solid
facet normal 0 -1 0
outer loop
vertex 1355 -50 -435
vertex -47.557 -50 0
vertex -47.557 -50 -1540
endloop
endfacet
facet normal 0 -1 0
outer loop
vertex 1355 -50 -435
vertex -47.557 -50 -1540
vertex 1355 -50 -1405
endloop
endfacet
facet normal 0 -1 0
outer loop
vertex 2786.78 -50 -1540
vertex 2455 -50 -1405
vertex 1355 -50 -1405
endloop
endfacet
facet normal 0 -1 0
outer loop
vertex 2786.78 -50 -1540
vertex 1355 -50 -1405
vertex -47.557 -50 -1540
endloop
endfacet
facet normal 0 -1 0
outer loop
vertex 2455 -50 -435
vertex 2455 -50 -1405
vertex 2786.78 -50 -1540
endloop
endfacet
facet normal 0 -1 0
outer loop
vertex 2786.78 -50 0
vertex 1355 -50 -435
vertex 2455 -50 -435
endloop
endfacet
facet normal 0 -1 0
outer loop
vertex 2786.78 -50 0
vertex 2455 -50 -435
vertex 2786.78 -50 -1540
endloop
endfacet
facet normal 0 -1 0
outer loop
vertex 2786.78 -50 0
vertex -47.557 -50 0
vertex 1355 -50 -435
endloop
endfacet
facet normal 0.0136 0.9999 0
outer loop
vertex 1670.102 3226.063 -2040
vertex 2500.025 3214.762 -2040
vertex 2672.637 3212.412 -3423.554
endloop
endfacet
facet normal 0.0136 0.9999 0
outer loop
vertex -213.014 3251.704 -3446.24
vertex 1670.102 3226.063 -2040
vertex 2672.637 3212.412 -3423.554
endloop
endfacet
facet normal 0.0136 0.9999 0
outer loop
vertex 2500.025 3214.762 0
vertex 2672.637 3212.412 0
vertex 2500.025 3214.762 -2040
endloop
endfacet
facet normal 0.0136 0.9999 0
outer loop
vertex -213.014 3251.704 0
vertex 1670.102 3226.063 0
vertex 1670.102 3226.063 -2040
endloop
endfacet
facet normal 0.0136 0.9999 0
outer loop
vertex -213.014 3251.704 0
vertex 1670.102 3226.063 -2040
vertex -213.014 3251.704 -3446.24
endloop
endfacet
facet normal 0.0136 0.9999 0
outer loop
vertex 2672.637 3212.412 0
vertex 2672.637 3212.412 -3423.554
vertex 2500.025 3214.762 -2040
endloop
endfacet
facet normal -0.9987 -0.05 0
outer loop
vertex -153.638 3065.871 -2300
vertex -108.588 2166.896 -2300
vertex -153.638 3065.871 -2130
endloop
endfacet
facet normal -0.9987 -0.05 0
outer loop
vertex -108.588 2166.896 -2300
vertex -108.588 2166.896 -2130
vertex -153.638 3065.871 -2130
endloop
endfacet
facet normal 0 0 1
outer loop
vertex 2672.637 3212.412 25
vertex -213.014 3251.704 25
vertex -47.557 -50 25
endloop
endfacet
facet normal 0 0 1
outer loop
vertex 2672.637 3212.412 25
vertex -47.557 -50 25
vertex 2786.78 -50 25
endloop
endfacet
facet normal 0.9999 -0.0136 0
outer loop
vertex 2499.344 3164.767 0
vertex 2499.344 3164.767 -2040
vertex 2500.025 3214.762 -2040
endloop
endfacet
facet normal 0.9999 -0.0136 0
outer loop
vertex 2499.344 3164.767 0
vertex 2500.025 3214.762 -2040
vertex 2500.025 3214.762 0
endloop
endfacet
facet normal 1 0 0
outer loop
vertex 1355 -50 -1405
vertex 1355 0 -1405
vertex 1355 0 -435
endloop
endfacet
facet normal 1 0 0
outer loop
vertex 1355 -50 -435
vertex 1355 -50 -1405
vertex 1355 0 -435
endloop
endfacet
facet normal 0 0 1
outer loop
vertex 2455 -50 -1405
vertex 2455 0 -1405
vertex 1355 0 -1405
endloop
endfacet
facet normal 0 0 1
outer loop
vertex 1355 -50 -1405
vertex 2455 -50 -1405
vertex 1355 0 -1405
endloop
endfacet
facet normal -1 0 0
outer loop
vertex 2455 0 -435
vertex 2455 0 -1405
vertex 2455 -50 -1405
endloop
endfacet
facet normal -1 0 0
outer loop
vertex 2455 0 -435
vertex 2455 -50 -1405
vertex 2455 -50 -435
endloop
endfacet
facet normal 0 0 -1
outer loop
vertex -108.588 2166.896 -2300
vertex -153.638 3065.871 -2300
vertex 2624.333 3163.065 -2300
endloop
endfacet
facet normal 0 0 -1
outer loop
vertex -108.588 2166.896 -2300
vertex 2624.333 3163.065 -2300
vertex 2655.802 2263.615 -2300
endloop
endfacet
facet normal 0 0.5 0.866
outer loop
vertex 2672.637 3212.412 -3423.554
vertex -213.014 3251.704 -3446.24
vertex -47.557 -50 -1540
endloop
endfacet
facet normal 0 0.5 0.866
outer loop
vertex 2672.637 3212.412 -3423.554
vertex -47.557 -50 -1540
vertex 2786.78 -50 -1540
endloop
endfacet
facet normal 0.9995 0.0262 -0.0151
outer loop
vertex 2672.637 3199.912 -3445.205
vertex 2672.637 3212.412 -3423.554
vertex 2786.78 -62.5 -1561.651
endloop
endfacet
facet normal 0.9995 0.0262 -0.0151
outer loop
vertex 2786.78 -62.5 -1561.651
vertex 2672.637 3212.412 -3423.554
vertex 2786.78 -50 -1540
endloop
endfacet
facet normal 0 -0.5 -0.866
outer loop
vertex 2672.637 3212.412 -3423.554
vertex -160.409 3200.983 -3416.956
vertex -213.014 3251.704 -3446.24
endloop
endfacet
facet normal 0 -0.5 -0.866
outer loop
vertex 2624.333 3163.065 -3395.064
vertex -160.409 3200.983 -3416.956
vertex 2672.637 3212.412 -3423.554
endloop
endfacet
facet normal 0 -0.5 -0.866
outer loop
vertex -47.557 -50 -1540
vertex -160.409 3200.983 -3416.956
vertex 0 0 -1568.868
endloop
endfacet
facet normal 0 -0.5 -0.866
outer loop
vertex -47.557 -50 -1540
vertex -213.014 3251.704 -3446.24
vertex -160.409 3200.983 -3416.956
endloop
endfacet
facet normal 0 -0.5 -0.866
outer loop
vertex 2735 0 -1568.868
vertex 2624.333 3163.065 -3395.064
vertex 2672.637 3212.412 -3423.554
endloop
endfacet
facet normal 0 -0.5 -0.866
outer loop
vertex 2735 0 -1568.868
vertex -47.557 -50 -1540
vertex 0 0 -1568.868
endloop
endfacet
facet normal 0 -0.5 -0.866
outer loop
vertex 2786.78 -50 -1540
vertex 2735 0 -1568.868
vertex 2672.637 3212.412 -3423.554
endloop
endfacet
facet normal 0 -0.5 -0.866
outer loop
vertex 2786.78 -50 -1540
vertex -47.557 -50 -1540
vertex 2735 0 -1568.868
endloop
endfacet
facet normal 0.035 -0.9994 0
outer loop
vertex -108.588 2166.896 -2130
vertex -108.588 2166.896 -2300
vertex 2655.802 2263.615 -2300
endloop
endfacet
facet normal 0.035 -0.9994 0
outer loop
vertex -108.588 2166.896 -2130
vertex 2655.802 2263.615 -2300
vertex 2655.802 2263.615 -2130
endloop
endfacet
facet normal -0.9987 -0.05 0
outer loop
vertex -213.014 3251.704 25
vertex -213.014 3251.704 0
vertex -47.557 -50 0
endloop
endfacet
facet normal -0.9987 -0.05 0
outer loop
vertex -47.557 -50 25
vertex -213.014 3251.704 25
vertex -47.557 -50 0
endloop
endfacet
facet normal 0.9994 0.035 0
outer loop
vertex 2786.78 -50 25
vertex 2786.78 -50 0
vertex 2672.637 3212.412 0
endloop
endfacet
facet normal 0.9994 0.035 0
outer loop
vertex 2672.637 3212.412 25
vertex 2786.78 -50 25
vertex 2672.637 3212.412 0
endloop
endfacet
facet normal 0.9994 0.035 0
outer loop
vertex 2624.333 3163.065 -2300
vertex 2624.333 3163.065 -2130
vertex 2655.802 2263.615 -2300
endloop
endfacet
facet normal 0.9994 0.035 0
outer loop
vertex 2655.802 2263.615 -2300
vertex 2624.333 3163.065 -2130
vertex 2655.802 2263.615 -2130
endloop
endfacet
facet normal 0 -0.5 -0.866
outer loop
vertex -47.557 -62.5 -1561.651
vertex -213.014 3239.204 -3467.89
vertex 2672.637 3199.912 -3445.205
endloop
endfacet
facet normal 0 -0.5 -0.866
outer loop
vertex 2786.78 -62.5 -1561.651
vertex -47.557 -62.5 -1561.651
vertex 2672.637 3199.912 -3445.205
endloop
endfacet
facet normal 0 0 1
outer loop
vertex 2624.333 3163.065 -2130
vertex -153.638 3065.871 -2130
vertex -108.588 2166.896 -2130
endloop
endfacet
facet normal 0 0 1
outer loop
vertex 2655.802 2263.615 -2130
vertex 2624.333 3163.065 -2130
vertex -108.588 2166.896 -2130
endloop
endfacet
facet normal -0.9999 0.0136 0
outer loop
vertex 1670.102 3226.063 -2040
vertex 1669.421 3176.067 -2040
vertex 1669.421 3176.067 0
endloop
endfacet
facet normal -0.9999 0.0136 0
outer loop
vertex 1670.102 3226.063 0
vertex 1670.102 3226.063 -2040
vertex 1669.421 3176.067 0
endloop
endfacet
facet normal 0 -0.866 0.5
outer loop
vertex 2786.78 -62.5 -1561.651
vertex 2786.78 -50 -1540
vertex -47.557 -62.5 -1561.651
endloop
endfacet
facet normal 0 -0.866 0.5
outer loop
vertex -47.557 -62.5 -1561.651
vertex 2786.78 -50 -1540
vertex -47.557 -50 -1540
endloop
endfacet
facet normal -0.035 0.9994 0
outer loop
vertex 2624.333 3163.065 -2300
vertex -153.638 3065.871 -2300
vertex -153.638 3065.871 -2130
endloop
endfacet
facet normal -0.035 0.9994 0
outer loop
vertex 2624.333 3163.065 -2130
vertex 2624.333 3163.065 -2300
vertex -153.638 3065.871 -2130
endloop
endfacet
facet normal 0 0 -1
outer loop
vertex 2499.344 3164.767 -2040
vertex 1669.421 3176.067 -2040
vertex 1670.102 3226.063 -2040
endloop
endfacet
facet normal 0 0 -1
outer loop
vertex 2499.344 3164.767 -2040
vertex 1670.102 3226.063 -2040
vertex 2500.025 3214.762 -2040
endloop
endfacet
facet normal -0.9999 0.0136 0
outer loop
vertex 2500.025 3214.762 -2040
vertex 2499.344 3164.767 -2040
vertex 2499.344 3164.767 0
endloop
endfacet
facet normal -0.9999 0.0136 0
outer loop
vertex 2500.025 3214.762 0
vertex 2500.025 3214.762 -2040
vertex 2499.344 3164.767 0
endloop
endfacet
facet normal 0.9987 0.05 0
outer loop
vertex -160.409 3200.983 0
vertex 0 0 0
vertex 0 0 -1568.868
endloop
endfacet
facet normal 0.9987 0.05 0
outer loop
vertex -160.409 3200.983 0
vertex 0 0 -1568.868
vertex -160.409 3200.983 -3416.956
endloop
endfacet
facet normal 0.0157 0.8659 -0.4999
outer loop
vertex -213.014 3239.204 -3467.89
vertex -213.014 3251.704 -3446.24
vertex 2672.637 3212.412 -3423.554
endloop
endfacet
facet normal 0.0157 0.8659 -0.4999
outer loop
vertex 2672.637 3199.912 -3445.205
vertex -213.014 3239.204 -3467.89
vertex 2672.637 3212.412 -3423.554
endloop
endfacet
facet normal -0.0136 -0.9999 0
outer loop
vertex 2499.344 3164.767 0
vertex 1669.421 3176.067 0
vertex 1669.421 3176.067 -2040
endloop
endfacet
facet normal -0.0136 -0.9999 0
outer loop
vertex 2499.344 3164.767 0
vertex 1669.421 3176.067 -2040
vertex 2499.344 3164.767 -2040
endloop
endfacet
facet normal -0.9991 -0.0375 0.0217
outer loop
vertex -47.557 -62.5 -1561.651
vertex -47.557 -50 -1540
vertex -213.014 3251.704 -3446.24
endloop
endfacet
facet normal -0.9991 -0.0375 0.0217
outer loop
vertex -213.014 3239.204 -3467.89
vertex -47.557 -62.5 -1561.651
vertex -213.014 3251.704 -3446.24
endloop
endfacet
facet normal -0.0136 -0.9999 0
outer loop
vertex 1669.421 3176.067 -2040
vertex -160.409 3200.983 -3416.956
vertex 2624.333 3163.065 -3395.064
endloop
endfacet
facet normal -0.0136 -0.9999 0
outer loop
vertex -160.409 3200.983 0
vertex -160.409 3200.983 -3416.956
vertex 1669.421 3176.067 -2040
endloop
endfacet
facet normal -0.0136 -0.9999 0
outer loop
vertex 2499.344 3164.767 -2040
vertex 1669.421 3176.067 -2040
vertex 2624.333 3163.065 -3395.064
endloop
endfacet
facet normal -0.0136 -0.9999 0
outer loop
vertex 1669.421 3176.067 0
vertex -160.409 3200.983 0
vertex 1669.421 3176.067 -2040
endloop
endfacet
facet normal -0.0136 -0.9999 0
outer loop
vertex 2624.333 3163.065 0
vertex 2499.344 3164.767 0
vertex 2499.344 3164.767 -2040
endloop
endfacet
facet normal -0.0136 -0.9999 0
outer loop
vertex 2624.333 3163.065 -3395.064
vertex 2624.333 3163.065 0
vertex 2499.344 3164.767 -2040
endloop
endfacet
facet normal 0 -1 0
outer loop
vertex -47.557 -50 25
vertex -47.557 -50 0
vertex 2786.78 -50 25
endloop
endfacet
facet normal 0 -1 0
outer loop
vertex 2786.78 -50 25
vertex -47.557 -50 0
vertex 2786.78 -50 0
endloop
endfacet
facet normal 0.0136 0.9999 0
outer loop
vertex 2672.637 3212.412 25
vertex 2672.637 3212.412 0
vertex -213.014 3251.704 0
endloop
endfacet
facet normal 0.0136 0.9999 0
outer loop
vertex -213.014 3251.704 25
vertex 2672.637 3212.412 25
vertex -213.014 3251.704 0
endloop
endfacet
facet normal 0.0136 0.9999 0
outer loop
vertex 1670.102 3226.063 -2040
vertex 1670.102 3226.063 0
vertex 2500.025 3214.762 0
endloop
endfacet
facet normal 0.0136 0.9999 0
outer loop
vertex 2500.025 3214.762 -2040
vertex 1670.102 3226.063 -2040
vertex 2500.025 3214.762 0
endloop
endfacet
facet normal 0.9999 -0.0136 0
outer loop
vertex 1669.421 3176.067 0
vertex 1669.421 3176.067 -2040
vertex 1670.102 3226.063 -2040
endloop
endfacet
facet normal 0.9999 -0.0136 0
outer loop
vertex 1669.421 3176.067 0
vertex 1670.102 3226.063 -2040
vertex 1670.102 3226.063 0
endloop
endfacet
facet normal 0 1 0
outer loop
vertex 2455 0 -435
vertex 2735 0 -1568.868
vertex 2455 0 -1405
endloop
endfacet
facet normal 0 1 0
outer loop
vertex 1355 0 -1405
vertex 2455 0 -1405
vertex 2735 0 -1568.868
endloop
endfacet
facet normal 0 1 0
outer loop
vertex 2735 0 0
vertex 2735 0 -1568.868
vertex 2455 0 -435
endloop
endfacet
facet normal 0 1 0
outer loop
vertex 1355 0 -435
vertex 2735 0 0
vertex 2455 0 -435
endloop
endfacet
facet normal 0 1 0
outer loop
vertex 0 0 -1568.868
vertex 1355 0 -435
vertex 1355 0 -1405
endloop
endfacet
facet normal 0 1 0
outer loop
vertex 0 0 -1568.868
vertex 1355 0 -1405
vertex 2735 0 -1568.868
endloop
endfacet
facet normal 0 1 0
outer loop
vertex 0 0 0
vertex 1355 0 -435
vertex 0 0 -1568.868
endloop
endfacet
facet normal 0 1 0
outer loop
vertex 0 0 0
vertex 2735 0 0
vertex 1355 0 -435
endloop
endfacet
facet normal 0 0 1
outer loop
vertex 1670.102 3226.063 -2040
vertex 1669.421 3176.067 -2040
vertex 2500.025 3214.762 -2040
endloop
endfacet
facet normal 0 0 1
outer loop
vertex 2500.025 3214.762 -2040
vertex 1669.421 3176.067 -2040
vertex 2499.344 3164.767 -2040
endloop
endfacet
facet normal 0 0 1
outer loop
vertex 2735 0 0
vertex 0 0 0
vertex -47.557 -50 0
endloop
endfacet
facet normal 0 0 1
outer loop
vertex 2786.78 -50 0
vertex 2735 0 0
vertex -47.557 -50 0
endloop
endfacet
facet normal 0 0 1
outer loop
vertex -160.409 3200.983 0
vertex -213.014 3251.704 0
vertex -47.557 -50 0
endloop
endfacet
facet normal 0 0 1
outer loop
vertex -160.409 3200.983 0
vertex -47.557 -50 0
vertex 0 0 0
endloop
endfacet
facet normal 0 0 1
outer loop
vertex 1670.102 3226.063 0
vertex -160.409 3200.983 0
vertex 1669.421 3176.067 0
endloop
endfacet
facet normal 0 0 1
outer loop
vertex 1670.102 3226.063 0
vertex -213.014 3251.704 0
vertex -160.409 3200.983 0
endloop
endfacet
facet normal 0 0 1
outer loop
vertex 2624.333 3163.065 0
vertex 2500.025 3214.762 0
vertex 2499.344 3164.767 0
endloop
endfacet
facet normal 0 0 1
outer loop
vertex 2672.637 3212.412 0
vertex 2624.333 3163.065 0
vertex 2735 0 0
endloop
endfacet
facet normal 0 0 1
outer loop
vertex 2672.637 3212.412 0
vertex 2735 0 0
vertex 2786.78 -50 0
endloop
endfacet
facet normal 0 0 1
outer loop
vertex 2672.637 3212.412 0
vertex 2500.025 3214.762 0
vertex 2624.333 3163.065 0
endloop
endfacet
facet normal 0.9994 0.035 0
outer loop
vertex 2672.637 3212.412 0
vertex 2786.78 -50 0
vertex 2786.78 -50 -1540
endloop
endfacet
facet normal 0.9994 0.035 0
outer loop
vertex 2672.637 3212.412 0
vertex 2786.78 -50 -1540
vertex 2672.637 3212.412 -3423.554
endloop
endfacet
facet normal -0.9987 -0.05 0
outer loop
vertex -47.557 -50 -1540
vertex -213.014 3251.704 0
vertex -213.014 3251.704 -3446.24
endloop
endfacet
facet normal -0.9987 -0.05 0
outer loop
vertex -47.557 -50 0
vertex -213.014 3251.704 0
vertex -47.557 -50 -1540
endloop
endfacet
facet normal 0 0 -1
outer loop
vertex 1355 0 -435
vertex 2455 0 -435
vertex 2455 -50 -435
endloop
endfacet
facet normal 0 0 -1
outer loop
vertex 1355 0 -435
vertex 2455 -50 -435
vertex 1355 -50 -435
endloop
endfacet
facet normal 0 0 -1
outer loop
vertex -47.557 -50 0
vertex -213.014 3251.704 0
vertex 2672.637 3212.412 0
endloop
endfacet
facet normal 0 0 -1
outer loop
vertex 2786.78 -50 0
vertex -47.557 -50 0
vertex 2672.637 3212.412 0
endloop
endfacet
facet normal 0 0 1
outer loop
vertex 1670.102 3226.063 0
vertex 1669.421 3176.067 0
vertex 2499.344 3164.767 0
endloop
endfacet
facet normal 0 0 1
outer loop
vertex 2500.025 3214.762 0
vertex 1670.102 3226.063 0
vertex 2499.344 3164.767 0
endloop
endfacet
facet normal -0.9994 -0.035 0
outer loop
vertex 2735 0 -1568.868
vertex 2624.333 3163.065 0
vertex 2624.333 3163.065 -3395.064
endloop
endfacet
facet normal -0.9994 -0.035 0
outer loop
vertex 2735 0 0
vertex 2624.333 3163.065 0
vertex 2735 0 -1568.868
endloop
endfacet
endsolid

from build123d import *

# Parameters (mm, degrees)
F1_DEPTH  = 4110
F5_DEPTH  = 4144.3607151471
F6_DEPTH  = 25
F8_DEPTH  = 25
F9_W      = 830
F9_H      = 2040
F10_DEPTH = 90.8441419245
F11_DEPTH = 50.0000007451
F12_W     = 900
F12_H     = 170
F14_W     = 1100
F14_H     = 970
F15_DEPTH = 62.5010007451


with BuildPart() as f1:
    # F0 (on Top) → F1 (new body)
    with BuildSketch(Plane.XY):
        Polygon((-213.0136198584, 3251.7042017552), (-47.5571200971, -50.0000007451), (2786.7799622254, -50.0000007451), (2672.6368005452, 3212.4115137828), align=None)
        Polygon((2735, 0), (0, 0), (-160.4091268056, 3200.9832726894), (2624.3327239488, 3163.0646142644), align=None, mode=Mode.SUBTRACT)
    extrude(amount=-F1_DEPTH)

    # F4 (on line) → F5 (cut, through all)
    with BuildSketch(Plane(origin=(0, 629.3395603552, -363.3493645828), x_dir=(-1, 0, 0), z_dir=(0, 0.8660254038, -0.5))):
        Polygon((1857.9003810883, -1358.6791222006), (47.5571200971, -1358.6791222006), (-2786.7799622254, -1358.6791222006), (-2786.7799622254, -4651.7086029053), (1857.9003810883, -4651.7086029053), align=None)
    extrude(amount=F5_DEPTH, mode=Mode.SUBTRACT)

    # F9 (on face) → F10 (cut, through all)
    with BuildSketch(Plane(origin=(43.5486267236, 3198.2060657511, 0), x_dir=(0.9999073073, -0.0136153172, 0), z_dir=(-0.0136153172, -0.9999073073, 0))):
        with Locations((2041.0233393178, -1020)):
            Rectangle(F9_W, F9_H)
    extrude(amount=-F10_DEPTH, mode=Mode.SUBTRACT)


with BuildPart() as f6:
    # F0 (on Top) → F6 (new body)
    with BuildSketch(Plane.XY):
        Polygon((-213.0136198584, 3251.7042017552), (-47.5571200971, -50.0000007451), (2786.7799622254, -50.0000007451), (2672.6368005452, 3212.4115137828), align=None)
        Polygon((2735, 0), (0, 0), (-160.4091268056, 3200.9832726894), (2624.3327239488, 3163.0646142644), align=None, mode=Mode.SUBTRACT)
        Polygon((-160.4091268056, 3200.9832726894), (0, 0), (2735, 0), (2624.3327239488, 3163.0646142644), align=None)
    extrude(amount=F6_DEPTH)


with BuildPart() as f8:
    # F7 (on face) → F8 (new body)
    with BuildSketch(Plane(origin=(0, -679.3395611003, -1176.6506354172), x_dir=(1, 0, 0), z_dir=(0, -0.5, -0.8660254038))):
        Polygon((-213.0136198584, -4539.1783493616), (2672.6368005452, -4493.8070614055), (2786.7799622254, -726.6987291655), (-47.5571200971, -726.6987291655), align=None)
        Polygon((2735, -784.4337569448), (2624.3327239488, -4436.8261699643), (-160.4091268056, -4480.6108652623), (0, -784.4337569448), align=None, mode=Mode.SUBTRACT)
        Polygon((-160.4091268056, -4480.6108652623), (2624.3327239488, -4436.8261699642), (2735, -784.4337569448), (0, -784.4337569448), align=None)
    extrude(amount=F8_DEPTH)


with BuildPart() as f11:
    # F9 (on face) → F11 (new body, through all)
    with BuildSketch(Plane(origin=(43.5486267236, 3198.2060657511, 0), x_dir=(0.9999073073, -0.0136153172, 0), z_dir=(-0.0136153172, -0.9999073073, 0))):
        with Locations((2041.0233393178, -1020)):
            Rectangle(F9_W, F9_H)
    extrude(amount=-F11_DEPTH)


with BuildPart() as f13:
    # F12 (on face) → F13 (new body, up to the next surface of F1)
    with BuildSketch(Plane(origin=(2731.6561380244, 95.5734329739, 0), x_dir=(0.034965964, -0.9993885037, 0), z_dir=(-0.9993885037, -0.034965964, 0))):
        with Locations((-2619.3680884676, -2215)):
            Rectangle(F12_W, F12_H)
    extrude(until=Until.NEXT, target=f1.part)


with BuildPart() as f1_1:
    add(f1.part)

    # F14 (on face) → F15 (cut, through all)
    with BuildSketch(Plane(origin=(0, 0, 0), x_dir=(-1, 0, 0), z_dir=(0, 1, 0))):
        with Locations((-1905, -920)):
            Rectangle(F14_W, F14_H)
    extrude(amount=-F15_DEPTH, mode=Mode.SUBTRACT)


solid = Compound([f6.part, f8.part, f11.part, f13.part, f1_1.part])
